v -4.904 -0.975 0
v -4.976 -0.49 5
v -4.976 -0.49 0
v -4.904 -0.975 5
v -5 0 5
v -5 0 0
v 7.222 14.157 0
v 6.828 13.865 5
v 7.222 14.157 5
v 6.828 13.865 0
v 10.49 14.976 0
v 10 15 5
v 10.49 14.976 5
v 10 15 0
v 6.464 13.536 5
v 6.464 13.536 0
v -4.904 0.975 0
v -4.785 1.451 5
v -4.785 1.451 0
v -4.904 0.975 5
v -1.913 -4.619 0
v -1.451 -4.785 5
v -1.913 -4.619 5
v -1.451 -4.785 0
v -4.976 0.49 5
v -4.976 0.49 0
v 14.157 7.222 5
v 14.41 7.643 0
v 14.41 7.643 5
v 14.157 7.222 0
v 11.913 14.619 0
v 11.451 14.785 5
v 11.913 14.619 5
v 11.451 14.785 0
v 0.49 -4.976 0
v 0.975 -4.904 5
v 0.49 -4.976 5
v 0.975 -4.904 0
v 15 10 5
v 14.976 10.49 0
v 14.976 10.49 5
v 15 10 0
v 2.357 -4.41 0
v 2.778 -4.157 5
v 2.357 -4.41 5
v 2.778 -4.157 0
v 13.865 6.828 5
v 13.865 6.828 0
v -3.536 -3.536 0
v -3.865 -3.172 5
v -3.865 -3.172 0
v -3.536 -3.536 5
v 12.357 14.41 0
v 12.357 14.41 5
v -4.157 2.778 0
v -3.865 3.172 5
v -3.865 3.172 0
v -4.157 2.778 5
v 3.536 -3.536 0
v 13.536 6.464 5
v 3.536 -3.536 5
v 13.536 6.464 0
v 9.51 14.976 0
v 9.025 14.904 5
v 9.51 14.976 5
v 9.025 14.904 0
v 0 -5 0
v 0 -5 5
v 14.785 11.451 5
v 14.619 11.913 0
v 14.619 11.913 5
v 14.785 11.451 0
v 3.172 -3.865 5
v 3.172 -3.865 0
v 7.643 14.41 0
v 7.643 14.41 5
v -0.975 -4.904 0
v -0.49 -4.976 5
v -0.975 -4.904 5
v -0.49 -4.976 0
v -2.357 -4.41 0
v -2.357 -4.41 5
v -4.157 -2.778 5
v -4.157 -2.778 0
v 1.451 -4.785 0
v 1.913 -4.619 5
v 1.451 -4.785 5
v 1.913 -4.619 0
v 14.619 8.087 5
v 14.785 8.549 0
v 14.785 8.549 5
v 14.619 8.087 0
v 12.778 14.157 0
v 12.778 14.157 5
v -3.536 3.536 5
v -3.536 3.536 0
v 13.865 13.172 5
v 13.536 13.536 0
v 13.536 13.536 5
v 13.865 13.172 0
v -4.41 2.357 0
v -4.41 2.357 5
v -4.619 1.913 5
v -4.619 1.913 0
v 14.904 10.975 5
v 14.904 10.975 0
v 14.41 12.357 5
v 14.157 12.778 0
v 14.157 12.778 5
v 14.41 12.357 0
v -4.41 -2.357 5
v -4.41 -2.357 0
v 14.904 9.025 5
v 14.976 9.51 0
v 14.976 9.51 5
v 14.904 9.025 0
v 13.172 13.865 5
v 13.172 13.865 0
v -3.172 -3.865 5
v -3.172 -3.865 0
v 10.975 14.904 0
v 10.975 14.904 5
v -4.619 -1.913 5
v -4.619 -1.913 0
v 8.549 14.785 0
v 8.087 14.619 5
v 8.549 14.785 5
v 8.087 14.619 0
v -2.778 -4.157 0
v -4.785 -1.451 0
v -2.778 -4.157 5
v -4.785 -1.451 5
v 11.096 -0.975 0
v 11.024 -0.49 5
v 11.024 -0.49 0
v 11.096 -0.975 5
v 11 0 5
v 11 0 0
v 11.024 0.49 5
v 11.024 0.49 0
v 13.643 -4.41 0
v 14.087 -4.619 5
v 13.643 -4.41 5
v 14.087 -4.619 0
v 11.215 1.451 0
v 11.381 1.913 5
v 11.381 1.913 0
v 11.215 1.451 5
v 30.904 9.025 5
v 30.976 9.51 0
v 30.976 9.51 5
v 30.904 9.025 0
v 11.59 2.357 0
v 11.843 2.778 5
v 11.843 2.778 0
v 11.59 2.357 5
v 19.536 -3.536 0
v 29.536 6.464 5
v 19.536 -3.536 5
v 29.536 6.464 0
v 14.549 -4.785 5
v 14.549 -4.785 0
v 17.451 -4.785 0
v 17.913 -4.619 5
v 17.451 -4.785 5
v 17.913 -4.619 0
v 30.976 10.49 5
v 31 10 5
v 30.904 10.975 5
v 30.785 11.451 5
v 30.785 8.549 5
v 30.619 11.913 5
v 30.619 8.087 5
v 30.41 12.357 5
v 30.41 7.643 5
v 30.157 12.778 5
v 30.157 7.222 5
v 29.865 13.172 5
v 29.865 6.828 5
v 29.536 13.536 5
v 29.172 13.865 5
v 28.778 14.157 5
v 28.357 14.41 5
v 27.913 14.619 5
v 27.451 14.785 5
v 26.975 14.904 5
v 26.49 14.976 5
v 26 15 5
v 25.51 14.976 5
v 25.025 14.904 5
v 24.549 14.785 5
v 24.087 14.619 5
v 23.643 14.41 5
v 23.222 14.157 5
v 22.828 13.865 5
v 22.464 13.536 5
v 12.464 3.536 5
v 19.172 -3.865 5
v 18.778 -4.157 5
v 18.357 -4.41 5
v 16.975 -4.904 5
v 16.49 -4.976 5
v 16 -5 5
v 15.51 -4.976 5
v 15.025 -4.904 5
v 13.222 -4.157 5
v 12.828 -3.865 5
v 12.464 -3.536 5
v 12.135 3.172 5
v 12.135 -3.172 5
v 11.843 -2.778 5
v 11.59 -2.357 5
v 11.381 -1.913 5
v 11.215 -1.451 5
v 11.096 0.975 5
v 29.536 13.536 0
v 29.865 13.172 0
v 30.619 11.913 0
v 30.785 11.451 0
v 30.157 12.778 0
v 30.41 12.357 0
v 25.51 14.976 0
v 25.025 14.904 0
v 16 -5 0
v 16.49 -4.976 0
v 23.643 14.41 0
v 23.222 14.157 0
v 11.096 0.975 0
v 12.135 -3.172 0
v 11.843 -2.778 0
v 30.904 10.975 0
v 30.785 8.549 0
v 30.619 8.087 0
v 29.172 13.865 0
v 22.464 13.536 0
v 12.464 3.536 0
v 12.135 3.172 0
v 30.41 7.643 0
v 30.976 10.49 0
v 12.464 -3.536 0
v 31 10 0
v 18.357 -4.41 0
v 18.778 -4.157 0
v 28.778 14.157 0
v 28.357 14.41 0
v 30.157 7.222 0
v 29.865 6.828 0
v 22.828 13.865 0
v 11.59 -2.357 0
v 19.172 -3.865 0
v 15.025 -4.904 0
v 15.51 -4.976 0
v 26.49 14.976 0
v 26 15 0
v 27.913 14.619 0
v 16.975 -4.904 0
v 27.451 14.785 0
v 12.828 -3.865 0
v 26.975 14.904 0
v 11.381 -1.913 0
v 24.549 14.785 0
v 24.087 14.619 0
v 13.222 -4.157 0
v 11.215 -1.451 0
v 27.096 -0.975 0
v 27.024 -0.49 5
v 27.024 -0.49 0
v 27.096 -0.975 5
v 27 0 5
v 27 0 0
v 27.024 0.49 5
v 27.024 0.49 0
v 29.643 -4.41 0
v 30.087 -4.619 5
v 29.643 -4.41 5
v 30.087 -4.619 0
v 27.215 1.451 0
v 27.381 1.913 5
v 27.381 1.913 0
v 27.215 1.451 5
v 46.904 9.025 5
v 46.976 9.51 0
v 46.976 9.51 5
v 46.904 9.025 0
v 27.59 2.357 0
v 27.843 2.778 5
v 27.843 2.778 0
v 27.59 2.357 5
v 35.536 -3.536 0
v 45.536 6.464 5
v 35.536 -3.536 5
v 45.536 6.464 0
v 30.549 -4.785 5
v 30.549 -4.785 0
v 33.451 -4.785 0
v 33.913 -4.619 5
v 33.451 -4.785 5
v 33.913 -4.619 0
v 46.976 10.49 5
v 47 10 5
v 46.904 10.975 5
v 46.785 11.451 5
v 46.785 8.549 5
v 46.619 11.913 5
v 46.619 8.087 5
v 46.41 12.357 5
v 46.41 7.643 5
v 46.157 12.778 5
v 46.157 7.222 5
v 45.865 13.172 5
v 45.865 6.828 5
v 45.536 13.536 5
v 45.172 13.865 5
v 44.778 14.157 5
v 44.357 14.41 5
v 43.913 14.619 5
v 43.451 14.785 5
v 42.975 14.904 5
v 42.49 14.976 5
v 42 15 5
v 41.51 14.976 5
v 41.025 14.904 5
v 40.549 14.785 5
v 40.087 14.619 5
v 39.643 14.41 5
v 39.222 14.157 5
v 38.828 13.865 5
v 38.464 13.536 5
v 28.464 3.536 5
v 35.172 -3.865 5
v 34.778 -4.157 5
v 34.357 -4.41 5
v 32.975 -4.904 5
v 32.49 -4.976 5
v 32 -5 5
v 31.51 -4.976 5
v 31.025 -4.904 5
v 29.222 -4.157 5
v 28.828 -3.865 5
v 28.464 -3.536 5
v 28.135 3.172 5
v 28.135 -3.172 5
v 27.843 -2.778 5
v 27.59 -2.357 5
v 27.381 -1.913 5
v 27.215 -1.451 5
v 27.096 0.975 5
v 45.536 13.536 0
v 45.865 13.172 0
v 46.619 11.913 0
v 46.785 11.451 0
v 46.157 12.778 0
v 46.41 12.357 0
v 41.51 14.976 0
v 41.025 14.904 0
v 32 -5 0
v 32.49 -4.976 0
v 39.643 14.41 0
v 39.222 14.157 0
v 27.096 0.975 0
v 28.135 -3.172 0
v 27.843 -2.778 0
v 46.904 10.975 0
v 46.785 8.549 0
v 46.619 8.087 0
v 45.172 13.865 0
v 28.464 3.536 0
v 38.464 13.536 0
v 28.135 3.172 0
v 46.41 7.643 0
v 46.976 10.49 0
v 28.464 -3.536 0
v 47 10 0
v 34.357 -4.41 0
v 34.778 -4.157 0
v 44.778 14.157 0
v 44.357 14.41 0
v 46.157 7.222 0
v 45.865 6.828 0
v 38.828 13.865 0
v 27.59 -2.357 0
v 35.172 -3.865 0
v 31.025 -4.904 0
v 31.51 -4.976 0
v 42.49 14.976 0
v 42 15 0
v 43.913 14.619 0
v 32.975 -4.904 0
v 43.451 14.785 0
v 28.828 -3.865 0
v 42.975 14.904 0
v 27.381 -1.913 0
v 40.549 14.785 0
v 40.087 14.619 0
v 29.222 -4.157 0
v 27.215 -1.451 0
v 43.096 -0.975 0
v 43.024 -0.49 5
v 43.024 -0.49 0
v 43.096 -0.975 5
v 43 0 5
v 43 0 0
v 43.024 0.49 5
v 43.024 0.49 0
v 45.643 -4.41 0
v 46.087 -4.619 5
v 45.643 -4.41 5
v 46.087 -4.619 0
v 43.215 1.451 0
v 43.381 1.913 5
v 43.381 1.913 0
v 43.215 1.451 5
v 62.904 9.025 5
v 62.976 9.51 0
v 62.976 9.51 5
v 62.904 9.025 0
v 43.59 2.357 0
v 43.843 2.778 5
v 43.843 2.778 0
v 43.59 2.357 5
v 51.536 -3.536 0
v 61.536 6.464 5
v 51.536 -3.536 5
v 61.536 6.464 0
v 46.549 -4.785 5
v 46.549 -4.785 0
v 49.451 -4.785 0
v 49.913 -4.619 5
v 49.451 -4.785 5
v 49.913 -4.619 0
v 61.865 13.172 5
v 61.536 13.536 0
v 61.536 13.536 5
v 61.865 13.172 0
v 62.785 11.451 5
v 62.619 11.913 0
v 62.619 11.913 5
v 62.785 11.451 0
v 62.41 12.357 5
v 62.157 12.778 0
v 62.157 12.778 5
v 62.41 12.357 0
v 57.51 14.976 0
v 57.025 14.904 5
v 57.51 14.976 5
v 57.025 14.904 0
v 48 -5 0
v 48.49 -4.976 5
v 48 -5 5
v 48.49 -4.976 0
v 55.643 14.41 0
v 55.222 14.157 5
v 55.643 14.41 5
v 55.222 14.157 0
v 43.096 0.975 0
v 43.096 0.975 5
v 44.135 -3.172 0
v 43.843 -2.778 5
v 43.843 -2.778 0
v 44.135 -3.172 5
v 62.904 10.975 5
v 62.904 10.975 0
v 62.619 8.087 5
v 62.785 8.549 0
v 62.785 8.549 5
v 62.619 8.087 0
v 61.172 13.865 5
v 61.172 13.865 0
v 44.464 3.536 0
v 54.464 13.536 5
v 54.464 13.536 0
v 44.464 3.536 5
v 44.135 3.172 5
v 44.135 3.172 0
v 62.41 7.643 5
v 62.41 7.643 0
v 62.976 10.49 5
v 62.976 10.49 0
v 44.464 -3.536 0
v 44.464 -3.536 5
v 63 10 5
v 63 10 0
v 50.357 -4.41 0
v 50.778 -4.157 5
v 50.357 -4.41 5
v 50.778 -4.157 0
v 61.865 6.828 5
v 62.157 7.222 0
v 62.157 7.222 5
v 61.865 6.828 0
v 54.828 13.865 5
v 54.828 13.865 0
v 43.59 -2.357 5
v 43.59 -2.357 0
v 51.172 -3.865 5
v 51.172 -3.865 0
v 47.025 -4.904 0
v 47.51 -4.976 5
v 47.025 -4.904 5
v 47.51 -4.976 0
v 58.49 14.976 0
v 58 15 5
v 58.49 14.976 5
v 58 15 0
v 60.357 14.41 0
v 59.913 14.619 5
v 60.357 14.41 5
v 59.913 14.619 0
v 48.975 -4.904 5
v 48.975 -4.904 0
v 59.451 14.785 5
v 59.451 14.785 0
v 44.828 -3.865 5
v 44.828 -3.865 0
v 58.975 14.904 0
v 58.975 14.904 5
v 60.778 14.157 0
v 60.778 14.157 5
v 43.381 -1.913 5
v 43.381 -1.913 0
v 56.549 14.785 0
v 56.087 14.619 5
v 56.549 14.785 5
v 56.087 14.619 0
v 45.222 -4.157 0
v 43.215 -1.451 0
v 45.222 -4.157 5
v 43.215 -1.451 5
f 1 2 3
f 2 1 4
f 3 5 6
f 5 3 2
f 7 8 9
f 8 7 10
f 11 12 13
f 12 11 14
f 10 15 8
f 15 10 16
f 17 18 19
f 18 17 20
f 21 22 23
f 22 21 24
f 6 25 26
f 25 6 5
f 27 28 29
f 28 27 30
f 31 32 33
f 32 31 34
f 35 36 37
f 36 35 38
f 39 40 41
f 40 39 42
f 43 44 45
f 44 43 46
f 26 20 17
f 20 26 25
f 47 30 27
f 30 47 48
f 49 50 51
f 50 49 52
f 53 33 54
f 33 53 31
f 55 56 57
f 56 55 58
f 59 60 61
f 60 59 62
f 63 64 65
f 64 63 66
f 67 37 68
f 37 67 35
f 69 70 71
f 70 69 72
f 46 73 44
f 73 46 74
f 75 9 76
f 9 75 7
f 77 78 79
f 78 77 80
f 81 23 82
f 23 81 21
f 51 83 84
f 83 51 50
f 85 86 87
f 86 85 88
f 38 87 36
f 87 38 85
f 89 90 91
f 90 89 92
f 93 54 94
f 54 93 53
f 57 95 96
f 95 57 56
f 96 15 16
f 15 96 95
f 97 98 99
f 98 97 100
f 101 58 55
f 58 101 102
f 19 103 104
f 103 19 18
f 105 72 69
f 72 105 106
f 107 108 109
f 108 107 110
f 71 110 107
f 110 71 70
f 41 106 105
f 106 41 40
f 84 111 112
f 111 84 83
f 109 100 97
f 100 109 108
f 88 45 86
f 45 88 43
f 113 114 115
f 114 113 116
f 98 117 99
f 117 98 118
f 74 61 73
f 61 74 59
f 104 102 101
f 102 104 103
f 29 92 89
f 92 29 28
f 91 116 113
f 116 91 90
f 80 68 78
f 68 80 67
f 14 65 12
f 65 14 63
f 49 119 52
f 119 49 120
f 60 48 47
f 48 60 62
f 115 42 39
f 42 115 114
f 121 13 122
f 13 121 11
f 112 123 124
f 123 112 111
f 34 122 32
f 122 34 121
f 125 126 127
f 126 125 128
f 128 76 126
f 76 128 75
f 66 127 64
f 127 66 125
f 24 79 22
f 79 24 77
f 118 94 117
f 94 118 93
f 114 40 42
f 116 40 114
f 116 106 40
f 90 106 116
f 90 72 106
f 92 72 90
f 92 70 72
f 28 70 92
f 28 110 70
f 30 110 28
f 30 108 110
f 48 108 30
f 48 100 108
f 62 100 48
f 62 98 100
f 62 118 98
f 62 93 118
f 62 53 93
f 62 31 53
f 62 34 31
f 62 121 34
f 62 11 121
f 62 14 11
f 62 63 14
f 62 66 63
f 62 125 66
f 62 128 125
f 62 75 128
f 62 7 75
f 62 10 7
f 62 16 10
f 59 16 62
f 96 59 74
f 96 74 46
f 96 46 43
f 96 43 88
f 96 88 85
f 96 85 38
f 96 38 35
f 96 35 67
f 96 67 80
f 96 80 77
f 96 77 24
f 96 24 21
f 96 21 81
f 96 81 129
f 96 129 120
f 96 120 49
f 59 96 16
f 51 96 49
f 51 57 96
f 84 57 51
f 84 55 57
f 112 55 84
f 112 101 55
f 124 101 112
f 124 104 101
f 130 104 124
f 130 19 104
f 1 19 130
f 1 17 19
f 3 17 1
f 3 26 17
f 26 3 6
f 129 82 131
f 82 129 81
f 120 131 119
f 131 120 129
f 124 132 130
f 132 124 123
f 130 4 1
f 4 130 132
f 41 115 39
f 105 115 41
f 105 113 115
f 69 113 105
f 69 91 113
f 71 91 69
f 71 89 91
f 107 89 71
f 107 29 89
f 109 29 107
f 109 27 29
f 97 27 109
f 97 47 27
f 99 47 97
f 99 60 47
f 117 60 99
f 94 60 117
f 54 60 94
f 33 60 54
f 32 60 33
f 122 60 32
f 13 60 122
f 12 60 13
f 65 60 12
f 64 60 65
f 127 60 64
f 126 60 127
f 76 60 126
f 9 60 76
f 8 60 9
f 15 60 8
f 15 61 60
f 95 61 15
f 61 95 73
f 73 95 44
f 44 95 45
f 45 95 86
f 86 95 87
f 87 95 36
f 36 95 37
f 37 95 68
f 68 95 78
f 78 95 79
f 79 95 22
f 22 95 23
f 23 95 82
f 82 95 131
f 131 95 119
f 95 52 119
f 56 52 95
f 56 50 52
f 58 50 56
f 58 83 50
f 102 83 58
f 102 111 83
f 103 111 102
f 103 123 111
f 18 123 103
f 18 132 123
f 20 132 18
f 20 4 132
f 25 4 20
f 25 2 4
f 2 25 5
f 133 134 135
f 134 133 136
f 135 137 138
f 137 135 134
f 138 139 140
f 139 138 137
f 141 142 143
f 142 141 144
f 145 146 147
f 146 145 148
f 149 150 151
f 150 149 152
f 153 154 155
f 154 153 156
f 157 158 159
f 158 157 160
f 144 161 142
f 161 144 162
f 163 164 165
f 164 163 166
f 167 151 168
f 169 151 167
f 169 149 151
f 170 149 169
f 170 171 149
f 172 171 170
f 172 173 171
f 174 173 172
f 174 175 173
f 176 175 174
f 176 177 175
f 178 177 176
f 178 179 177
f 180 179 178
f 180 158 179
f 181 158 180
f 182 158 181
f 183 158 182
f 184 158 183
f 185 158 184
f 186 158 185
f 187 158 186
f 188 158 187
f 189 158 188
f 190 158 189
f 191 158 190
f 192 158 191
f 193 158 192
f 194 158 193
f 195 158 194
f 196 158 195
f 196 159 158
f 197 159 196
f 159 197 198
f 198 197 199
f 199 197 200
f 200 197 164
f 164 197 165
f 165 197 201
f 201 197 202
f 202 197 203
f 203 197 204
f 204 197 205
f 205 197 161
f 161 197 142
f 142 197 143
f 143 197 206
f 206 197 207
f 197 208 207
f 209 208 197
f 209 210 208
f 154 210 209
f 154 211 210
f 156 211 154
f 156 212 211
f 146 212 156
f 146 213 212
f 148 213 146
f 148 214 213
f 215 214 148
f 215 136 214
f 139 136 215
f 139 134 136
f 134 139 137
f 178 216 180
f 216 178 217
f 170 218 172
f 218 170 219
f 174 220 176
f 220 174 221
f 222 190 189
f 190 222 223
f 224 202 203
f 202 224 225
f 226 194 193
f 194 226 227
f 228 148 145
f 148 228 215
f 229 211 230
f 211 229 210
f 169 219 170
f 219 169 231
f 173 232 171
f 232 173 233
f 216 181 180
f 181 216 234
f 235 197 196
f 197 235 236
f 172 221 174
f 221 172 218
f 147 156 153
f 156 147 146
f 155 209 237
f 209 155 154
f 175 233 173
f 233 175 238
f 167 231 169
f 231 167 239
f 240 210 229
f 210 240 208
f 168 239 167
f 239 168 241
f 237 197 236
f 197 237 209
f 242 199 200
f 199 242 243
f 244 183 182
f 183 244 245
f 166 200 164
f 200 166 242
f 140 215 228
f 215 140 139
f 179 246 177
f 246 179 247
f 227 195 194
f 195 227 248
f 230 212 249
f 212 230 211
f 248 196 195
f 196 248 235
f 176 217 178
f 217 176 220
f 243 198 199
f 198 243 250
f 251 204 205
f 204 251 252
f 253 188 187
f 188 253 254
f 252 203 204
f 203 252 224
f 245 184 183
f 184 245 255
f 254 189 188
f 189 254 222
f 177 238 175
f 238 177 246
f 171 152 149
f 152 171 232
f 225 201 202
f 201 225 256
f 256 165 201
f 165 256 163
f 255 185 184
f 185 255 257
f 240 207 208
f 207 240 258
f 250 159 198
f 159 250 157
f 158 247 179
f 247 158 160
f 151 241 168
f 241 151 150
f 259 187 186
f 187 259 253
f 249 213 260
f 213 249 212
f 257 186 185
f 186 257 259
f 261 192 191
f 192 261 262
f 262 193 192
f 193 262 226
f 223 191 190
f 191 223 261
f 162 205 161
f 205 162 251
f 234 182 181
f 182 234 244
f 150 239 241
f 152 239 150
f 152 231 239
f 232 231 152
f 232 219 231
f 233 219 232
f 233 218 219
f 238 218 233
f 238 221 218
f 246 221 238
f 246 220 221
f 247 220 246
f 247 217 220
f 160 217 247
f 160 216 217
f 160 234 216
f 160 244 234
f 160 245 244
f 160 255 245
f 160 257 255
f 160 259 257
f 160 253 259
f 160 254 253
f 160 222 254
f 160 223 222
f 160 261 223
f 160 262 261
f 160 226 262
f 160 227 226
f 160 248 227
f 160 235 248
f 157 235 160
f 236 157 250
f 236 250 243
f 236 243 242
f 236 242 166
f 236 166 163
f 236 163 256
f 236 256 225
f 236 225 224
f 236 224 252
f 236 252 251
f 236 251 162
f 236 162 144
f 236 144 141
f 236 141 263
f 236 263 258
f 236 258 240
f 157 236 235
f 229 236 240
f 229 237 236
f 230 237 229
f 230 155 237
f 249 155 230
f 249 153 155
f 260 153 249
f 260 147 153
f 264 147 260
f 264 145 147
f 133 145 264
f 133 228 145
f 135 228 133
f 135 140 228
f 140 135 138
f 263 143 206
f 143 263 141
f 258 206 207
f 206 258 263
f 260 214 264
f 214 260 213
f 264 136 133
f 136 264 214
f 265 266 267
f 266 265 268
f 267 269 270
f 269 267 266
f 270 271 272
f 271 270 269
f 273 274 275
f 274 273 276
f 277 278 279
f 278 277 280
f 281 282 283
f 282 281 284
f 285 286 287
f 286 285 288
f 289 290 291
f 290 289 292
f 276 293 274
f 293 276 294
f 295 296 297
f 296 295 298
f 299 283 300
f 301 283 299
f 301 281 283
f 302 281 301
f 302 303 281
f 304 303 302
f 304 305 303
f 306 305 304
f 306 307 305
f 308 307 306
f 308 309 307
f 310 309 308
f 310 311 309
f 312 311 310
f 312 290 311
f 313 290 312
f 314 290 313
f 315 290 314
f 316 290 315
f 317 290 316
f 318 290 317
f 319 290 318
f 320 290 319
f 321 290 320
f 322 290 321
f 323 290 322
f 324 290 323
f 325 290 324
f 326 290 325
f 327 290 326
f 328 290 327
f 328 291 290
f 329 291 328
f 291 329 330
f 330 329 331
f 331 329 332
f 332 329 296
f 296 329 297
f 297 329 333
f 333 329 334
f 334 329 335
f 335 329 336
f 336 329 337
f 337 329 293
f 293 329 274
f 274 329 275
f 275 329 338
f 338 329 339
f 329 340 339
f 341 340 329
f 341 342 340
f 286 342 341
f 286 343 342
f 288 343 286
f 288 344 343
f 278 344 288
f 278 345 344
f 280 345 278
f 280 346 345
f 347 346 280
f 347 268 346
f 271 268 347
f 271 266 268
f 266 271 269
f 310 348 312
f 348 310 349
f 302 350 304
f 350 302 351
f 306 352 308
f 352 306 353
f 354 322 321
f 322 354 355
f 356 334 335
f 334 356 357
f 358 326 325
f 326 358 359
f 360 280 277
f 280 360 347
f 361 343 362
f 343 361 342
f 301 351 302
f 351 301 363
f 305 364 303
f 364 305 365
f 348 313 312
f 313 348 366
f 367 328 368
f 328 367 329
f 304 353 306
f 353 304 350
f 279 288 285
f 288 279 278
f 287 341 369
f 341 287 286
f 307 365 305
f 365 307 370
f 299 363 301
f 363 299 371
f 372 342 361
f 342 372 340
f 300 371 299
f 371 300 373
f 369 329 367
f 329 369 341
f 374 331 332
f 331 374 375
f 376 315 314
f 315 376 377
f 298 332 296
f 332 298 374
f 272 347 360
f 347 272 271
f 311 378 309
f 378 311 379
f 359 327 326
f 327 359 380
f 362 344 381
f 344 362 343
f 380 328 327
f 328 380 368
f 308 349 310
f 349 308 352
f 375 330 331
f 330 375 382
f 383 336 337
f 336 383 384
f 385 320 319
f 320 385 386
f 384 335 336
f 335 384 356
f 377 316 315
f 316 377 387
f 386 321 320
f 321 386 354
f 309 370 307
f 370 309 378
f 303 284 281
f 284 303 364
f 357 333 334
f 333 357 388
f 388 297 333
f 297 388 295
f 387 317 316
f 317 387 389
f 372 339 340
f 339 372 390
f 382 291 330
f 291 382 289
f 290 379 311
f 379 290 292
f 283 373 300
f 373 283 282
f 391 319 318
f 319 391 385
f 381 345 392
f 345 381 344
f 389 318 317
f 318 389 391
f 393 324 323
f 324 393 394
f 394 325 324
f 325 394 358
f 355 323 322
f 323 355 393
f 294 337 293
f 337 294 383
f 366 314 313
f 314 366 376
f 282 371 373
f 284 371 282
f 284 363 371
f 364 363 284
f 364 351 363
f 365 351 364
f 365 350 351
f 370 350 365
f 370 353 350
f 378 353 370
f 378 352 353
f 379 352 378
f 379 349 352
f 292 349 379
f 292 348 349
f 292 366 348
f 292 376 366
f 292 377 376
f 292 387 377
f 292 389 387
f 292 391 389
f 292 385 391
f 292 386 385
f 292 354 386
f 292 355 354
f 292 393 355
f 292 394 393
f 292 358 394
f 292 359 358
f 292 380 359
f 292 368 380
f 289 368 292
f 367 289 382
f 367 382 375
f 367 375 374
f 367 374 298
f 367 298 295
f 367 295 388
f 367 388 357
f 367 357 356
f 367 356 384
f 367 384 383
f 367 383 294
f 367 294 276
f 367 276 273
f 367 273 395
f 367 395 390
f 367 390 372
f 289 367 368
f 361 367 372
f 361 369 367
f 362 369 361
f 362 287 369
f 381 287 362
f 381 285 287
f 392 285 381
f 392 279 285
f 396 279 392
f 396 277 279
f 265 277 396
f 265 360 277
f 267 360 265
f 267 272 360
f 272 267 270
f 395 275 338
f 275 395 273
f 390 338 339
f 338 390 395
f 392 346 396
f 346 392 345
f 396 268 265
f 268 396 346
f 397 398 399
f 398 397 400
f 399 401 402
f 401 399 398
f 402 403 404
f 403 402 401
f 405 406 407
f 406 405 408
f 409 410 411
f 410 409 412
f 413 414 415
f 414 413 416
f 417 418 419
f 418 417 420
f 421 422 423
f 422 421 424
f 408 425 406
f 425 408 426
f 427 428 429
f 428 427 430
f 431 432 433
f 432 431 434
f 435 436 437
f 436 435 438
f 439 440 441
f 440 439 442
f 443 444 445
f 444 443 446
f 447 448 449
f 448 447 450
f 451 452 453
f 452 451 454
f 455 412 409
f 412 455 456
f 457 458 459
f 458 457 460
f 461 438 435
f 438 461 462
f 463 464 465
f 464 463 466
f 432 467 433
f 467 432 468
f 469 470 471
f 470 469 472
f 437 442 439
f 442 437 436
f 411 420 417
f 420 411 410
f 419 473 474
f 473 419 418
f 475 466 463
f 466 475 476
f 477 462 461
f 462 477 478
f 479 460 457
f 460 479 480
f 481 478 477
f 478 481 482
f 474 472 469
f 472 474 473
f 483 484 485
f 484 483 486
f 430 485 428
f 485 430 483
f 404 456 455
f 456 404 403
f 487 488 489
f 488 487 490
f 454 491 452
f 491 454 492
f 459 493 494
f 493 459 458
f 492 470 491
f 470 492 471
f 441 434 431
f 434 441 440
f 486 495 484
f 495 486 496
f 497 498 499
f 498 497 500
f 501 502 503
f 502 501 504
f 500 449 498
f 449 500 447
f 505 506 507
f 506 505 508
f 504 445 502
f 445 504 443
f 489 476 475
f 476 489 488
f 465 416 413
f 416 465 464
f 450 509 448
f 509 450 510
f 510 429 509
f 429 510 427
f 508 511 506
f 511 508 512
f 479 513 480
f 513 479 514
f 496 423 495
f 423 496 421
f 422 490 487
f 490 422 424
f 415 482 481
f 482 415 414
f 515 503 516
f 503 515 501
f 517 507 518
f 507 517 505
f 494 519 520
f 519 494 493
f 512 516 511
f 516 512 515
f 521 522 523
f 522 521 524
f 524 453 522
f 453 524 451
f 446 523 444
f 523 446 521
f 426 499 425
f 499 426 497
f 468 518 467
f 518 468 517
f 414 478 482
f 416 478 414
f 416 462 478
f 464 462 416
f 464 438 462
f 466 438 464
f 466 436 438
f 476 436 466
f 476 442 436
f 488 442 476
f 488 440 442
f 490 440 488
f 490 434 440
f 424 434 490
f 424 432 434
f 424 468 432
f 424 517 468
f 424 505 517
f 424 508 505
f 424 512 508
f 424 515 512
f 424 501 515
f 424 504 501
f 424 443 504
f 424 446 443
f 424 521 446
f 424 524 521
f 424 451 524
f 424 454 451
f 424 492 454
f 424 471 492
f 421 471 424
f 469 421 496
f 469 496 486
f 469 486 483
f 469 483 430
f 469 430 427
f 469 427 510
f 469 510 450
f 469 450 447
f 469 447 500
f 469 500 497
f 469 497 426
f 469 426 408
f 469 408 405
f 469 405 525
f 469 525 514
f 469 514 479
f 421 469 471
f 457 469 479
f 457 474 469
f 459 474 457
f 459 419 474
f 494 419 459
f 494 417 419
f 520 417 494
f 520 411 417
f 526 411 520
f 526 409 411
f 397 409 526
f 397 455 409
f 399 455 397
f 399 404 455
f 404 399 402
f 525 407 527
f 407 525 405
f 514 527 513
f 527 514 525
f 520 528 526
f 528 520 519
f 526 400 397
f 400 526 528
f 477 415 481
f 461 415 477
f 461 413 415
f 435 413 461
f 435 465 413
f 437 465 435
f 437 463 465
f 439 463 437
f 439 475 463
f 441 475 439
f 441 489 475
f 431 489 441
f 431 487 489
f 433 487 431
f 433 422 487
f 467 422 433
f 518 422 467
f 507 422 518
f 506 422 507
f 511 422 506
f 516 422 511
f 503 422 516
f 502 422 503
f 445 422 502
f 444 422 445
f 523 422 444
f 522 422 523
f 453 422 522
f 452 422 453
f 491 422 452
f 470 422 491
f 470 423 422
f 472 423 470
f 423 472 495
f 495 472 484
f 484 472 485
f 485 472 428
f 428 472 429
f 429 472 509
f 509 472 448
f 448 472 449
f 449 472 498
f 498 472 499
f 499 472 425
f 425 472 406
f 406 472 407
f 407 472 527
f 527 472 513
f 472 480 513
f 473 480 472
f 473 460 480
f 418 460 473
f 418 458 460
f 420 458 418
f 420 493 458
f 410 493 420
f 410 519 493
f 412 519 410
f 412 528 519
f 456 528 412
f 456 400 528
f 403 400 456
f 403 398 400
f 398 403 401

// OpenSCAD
module MultiplesOfExampleSlots(){
  color("teal")union(){
      linear_extrude(height=5)hull(){
          circle(d=10,$fn=64);
          translate([10, 10, 0])circle(d=10,$fn=64);
        }

      translate([16, 0, 0])union()linear_extrude(height=5)hull(){
              circle(d=10,$fn=64);
              translate([10, 10, 0])circle(d=10,$fn=64);
            }

      translate([32, 0, 0])union()linear_extrude(height=5)hull(){
              circle(d=10,$fn=64);
              translate([10, 10, 0])circle(d=10,$fn=64);
            }

      translate([48, 0, 0])union()linear_extrude(height=5)hull(){
              circle(d=10,$fn=64);
              translate([10, 10, 0])circle(d=10,$fn=64);
            }

    }
}
$fn=64;
MultiplesOfExampleSlots();
